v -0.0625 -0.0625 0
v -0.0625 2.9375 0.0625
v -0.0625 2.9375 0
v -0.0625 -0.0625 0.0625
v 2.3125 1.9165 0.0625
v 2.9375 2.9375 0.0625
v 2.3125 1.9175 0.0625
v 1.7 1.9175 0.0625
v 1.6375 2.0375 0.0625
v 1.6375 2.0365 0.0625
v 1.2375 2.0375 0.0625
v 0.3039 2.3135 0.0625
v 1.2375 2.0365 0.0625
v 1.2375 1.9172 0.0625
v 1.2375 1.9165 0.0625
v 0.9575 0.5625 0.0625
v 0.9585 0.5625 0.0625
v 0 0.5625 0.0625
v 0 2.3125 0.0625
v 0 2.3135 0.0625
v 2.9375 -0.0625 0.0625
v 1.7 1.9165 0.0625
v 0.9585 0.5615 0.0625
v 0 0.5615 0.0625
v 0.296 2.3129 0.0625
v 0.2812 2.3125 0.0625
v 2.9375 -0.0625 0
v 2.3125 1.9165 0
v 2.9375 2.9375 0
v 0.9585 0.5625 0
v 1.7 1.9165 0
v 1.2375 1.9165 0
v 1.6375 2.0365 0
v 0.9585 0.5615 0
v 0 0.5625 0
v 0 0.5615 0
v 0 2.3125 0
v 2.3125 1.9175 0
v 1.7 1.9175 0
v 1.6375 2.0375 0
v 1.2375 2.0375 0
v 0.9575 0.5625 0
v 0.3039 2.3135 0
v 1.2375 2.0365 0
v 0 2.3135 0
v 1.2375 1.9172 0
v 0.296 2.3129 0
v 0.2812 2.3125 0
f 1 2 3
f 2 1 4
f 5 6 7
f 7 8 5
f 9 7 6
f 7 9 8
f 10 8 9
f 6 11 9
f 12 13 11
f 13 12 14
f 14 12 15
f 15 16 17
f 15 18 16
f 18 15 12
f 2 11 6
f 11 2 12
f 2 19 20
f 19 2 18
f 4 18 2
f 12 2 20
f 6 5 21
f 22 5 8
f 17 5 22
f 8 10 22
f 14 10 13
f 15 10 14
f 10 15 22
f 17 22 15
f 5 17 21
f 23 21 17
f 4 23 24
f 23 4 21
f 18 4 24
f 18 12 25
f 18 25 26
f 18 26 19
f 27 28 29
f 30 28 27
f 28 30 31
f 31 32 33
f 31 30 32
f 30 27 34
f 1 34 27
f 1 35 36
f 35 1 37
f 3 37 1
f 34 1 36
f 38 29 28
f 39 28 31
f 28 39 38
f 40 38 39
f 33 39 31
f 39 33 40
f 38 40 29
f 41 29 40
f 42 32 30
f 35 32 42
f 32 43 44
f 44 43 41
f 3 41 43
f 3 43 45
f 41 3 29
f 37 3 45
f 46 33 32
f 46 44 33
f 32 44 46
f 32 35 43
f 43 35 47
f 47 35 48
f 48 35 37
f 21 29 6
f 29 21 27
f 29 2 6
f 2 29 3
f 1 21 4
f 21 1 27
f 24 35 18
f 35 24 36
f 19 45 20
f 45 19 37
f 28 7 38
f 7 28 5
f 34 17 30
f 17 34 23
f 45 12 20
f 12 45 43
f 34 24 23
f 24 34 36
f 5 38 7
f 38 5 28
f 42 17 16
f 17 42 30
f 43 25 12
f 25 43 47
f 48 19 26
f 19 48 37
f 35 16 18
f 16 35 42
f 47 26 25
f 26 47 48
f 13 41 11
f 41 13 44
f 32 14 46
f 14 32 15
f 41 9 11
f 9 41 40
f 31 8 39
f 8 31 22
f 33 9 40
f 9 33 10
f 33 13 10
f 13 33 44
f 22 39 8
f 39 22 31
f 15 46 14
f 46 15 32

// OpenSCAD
// element12.scad — left-turn belt tile (mirror of element11)
// Units: inches

straight   = false;
left_turn  = true;
right_turn = false;

plate_w = 2 + 7/8;
plate_d = 2 + 7/8;
plate_h = 1/16;
frame_w = 1/16;

belt_w    = 1.75;
belt_half = belt_w / 2;

hole_d = 3/32;
hole_r = hole_d / 2;

roller_count  = 13;
roller_h_size = 3/16;
roller_r      = roller_h_size / 2;
roller_inset  = plate_w / 20;
roller_x_lo   = 2 * roller_inset;
roller_x_hi   = plate_w - 2 * roller_inset;
roller_y_step = (plate_w - 2 * roller_inset) / 12;

b_L = plate_w / 2 - belt_half;
b_R = plate_w / 2 + belt_half;
nub = roller_x_hi - b_R;

arrow_w       = belt_w * 0.75;
arrow_shaft_w = arrow_w * 0.4;
arrow_shaft_h = 1.5;
arrow_head_h  = arrow_w / 2;
arrow_h       = arrow_shaft_h + arrow_head_h;
arrow_tip_y   = 3 * plate_d / 20 + 1/4 + 7 * plate_d / 10;
arrow_y       = arrow_tip_y - arrow_h;
arrow_outline = 1/16;

cx         = plate_w / 2;
r_curve    = 0.48;
y_merge    = arrow_y + arrow_shaft_h;
y_arc_ctr  = y_merge + 0.12;
y_entry    = y_arc_ctr + r_curve;
cx_l       = cx - r_curve;
cx_r       = cx + r_curve;
r_outer    = r_curve + belt_half;
h_straight = 0.24;

module rivet_holes() {
    spacing_x = plate_w / 10;
    spacing_y = plate_d / 10;
    inset_x   = spacing_x / 2;
    inset_y   = spacing_y / 2;
    translate([plate_w - inset_x, plate_d - inset_y, -1])
        cylinder(h = plate_h + 2, r = hole_r, $fn = 20);
    for (i = [0:9]) {
        translate([inset_x, inset_y + i * spacing_y, -1])
            cylinder(h = plate_h + 2, r = hole_r, $fn = 20);
        translate([inset_x + i * spacing_x, inset_y, -1])
            cylinder(h = plate_h + 2, r = hole_r, $fn = 20);
        if (inset_x + i * spacing_x <= roller_x_lo + roller_r - hole_r ||
            inset_x + i * spacing_x >= roller_x_hi - roller_r + hole_r) {
            translate([inset_x + i * spacing_x, plate_d - inset_y, -1])
                cylinder(h = plate_h + 2, r = hole_r, $fn = 20);
        }
    }
}

module frame() {
    color("black")
    difference() {
        translate([-frame_w, -frame_w, 0])
            cube([plate_w + 2 * frame_w, plate_d + 2 * frame_w, plate_h]);
        translate([0, 0, -0.001])
            cube([plate_w, plate_d, plate_h + 0.002]);
    }
}

module belt_cutout() {
    // Straight vertical strip (top)
    translate([(plate_w - belt_w) / 2, plate_d/2 + r_curve - 0.001, -0.001])
        cube([belt_w, plate_d/2 - r_curve + 0.002, plate_h + 0.002]);
    // Horizontal entry from right
    translate([cx_r - 0.001, plate_d/2 - belt_half - 0.001, -0.001])
        cube([plate_w - cx_r + 0.002, belt_w + 0.002, plate_h + 0.002]);
    // Arc corner fill: lower-left quadrant at (cx_r, plate_d/2 + r_curve)
    translate([cx_r, plate_d/2 + r_curve, -0.001])
    linear_extrude(plate_h + 0.002)
    intersection() {
        circle(r = r_outer, $fn = 120);
        translate([-r_outer, -r_outer]) square([r_outer, r_outer]);
    }
    // Curved corner — bottom-left of the top-right uncovered square
    translate([b_R, plate_d/2 + belt_half, -0.001])
    linear_extrude(plate_h + 0.002)
    difference() {
        square([b_L/2, b_L/2]);
        translate([b_L/2, b_L/2])
            circle(r = b_L/2, $fn = 120);
    }
}

module roller_slots() {
    // a. Horizontal bars — top-section only, right-clipped; i=12 full-width
    for (i = [0:roller_count - 1]) {
        if (roller_inset + i * roller_y_step >= y_arc_ctr - roller_y_step) {
            translate([0, 0, -0.001])
            hull() {
                translate([roller_x_lo + roller_r,
                           roller_inset + i * roller_y_step, 0])
                    cylinder(h = plate_h + 0.002, r = roller_r, $fn = 20);
                translate([(i == roller_count - 1 ? roller_x_hi : b_R) - roller_r,
                           roller_inset + i * roller_y_step, 0])
                    cylinder(h = plate_h + 0.002, r = roller_r, $fn = 20);
            }
        }
    }
    // b. Vertical entry bars — right side; skip if rx < cx_r
    for (i = [0:roller_count - 1]) {
        if (roller_inset + i * roller_y_step >= cx_r) {
            y_hi = (i == roller_count - 1) ? plate_d - roller_x_lo : plate_d/2 + belt_half;
            translate([0, 0, -0.001])
            hull() {
                translate([roller_inset + i * roller_y_step, roller_x_lo + roller_r, 0])
                    cylinder(h = plate_h + 0.002, r = roller_r, $fn = 20);
                translate([roller_inset + i * roller_y_step, y_hi - roller_r, 0])
                    cylinder(h = plate_h + 0.002, r = roller_r, $fn = 20);
            }
        }
    }
    // c. Arc radial bars — 11 bars, center (cx_r, plate_d/2 + r_curve), 180°–270°
    r_outer_bars = r_outer + nub;
    for (k = [0:10]) {
        theta = 180 + 2.25 + k * (85.5 / 10);
        translate([cx_r, plate_d/2 + r_curve, 0])
        rotate([0, 0, theta])
        translate([0, 0, -0.001])
        hull() {
            translate([r_outer_bars - roller_r, 0, 0])
                cylinder(h = plate_h + 0.002, r = roller_r, $fn = 20);
            translate([r_outer_bars - roller_r - nub, 0, 0])
                cylinder(h = plate_h + 0.002, r = roller_r, $fn = 20);
        }
    }
    // d. Diagonal corners — lower-right and upper-right of belt entry
    translate([b_R, plate_d/2 - belt_half, 0])
    rotate([0, 0, 45])
    translate([0, 0, -0.001])
    hull() {
        cylinder(h = plate_h + 0.002, r = roller_r, $fn = 20);
        translate([nub, 0, 0])
            cylinder(h = plate_h + 0.002, r = roller_r, $fn = 20);
    }
    translate([b_R, plate_d/2 + belt_half, 0])
    rotate([0, 0, 45])
    translate([0, 0, -0.001])
    hull() {
        cylinder(h = plate_h + 0.002, r = roller_r, $fn = 20);
        translate([nub, 0, 0])
            cylinder(h = plate_h + 0.002, r = roller_r, $fn = 20);
    }
}

module plate() {
    difference() {
        color("darkgray")
            cube([plate_w, plate_d, plate_h]);
        rivet_holes();
        roller_slots();
        belt_cutout();
    }
}

module rollers() {
    color("green")
    difference() {
        union() {
            // a. Horizontal bars
            for (i = [0:roller_count - 1]) {
                if (roller_inset + i * roller_y_step >= y_arc_ctr - roller_y_step) {
                    hull() {
                        translate([roller_x_lo + roller_r,
                                   roller_inset + i * roller_y_step, 0])
                            cylinder(h = plate_h, r = roller_r, $fn = 20);
                        translate([(i == roller_count - 1 ? roller_x_hi : b_R) - roller_r,
                                   roller_inset + i * roller_y_step, 0])
                            cylinder(h = plate_h, r = roller_r, $fn = 20);
                    }
                }
            }
            // b. Vertical entry bars
            for (i = [0:roller_count - 1]) {
                if (roller_inset + i * roller_y_step >= cx_r) {
                    y_hi = (i == roller_count - 1) ? plate_d - roller_x_lo : plate_d/2 + belt_half;
                    hull() {
                        translate([roller_inset + i * roller_y_step, roller_x_lo + roller_r, 0])
                            cylinder(h = plate_h, r = roller_r, $fn = 20);
                        translate([roller_inset + i * roller_y_step, y_hi - roller_r, 0])
                            cylinder(h = plate_h, r = roller_r, $fn = 20);
                    }
                }
            }
            // c. Arc radial bars
            r_outer_bars = r_outer + nub;
            for (k = [0:10]) {
                theta = 180 + 2.25 + k * (85.5 / 10);
                translate([cx_r, plate_d/2 + r_curve, 0])
                rotate([0, 0, theta])
                hull() {
                    translate([r_outer_bars - roller_r, 0, 0])
                        cylinder(h = plate_h, r = roller_r, $fn = 20);
                    translate([r_outer_bars - roller_r - nub, 0, 0])
                        cylinder(h = plate_h, r = roller_r, $fn = 20);
                }
            }
            // d. Diagonal corners — lower-right and upper-right of belt entry
            translate([b_R, plate_d/2 - belt_half, 0])
            rotate([0, 0, 45])
            hull() {
                cylinder(h = plate_h, r = roller_r, $fn = 20);
                translate([nub, 0, 0])
                    cylinder(h = plate_h, r = roller_r, $fn = 20);
            }
            translate([b_R, plate_d/2 + belt_half, 0])
            rotate([0, 0, 45])
            hull() {
                cylinder(h = plate_h, r = roller_r, $fn = 20);
                translate([nub, 0, 0])
                    cylinder(h = plate_h, r = roller_r, $fn = 20);
            }
        }
        belt_cutout();
    }
}

module rivets() {
    spacing_x = plate_w / 10;
    spacing_y = plate_d / 10;
    inset_x   = spacing_x / 2;
    inset_y   = spacing_y / 2;
    color("lightgray") {
        translate([plate_w - inset_x, plate_d - inset_y, 0])
            cylinder(h = plate_h, r = hole_r, $fn = 20);
        for (i = [0:9]) {
            translate([inset_x, inset_y + i * spacing_y, 0])
                cylinder(h = plate_h, r = hole_r, $fn = 20);
            translate([inset_x + i * spacing_x, inset_y, 0])
                cylinder(h = plate_h, r = hole_r, $fn = 20);
            if (inset_x + i * spacing_x <= roller_x_lo + roller_r - hole_r ||
                inset_x + i * spacing_x >= roller_x_hi - roller_r + hole_r) {
                translate([inset_x + i * spacing_x, plate_d - inset_y, 0])
                    cylinder(h = plate_h, r = hole_r, $fn = 20);
            }
        }
    }
}

module arrow_2d() {
    polygon([
        [-arrow_shaft_w / 2, 0],
        [ arrow_shaft_w / 2, 0],
        [ arrow_shaft_w / 2, arrow_shaft_h],
        [ arrow_w / 2,       arrow_shaft_h],
        [ 0,                 arrow_h],
        [-arrow_w / 2,       arrow_shaft_h],
        [-arrow_shaft_w / 2, arrow_shaft_h]
    ]);
}

module arrow() {
    color("green") {
        // Vertical segment: cx, from arc center up to arrowhead base
        translate([cx - arrow_shaft_w/2, plate_d/2 + r_curve, 0])
        linear_extrude(plate_h)
        difference() {
            square([arrow_shaft_w, y_merge - (plate_d/2 + r_curve)]);
            translate([arrow_outline, 0])
                square([arrow_shaft_w - 2*arrow_outline, y_merge - (plate_d/2 + r_curve)]);
        }
        // Arc shaft: hollow annulus, lower-left quadrant (180°–270°)
        translate([cx_r, plate_d/2 + r_curve, 0])
        linear_extrude(plate_h)
        intersection() {
            difference() {
                difference() {
                    circle(r = r_curve + arrow_shaft_w/2, $fn = 120);
                    circle(r = r_curve - arrow_shaft_w/2, $fn = 120);
                }
                offset(delta = -arrow_outline)
                difference() {
                    circle(r = r_curve + arrow_shaft_w/2, $fn = 120);
                    circle(r = r_curve - arrow_shaft_w/2, $fn = 120);
                }
            }
            translate([-(r_curve + arrow_shaft_w/2), -(r_curve + arrow_shaft_w/2)])
                square([r_curve + arrow_shaft_w/2, r_curve + arrow_shaft_w/2]);
        }
        // Horizontal segment: from arc 270° endpoint at (cx_r, plate_d/2) going right
        translate([cx_r, plate_d/2 - arrow_shaft_w/2, 0])
        linear_extrude(plate_h)
        difference() {
            square([h_straight, arrow_shaft_w]);
            translate([0, arrow_outline])
                square([h_straight, arrow_shaft_w - 2*arrow_outline]);
        }
        // End cap
        translate([cx_r + h_straight - arrow_outline, plate_d/2 - arrow_shaft_w/2, 0])
            cube([arrow_outline, arrow_shaft_w, plate_h]);
        // Arrowhead — clipped from full arrow_2d so base is open to shaft
        translate([cx, arrow_y, 0])
        linear_extrude(plate_h)
        intersection() {
            difference() {
                arrow_2d();
                offset(delta = -arrow_outline) arrow_2d();
            }
            translate([-arrow_w / 2, arrow_shaft_h])
                square([arrow_w, arrow_head_h]);
        }
    }
}

module belt() {
    color("black")
    difference() {
        union() {
            translate([cx_r, plate_d/2 - belt_half, 0])
                cube([plate_w - cx_r, belt_w, plate_h]);
            translate([cx_r, plate_d/2 + r_curve, 0])
            linear_extrude(plate_h)
            intersection() {
                circle(r = r_outer, $fn = 120);
                translate([-r_outer, -r_outer]) square([r_outer, r_outer]);
            }
            translate([b_L, plate_d/2 + r_curve, 0])
                cube([belt_w, plate_d/2 - r_curve, plate_h]);
            // Curved corner — bottom-left of the top-right uncovered square
            translate([b_R, plate_d/2 + belt_half, 0])
            linear_extrude(plate_h)
            difference() {
                square([b_L/2, b_L/2]);
                translate([b_L/2, b_L/2])
                    circle(r = b_L/2, $fn = 120);
            }
        }
        // Vertical segment cutout
        translate([cx - arrow_shaft_w/2, plate_d/2 + r_curve - 0.001, -0.001])
        linear_extrude(plate_h + 0.002)
        difference() {
            square([arrow_shaft_w, y_merge - (plate_d/2 + r_curve) + 0.001]);
            translate([arrow_outline, 0])
                square([arrow_shaft_w - 2*arrow_outline, y_merge - (plate_d/2 + r_curve)]);
        }
        // Arc shaft cutout
        translate([cx_r, plate_d/2 + r_curve, -0.001])
        linear_extrude(plate_h + 0.002)
        intersection() {
            difference() {
                difference() {
                    circle(r = r_curve + arrow_shaft_w/2, $fn = 120);
                    circle(r = r_curve - arrow_shaft_w/2, $fn = 120);
                }
                offset(delta = -arrow_outline)
                difference() {
                    circle(r = r_curve + arrow_shaft_w/2, $fn = 120);
                    circle(r = r_curve - arrow_shaft_w/2, $fn = 120);
                }
            }
            translate([-(r_curve + arrow_shaft_w/2), -(r_curve + arrow_shaft_w/2)])
                square([r_curve + arrow_shaft_w/2, r_curve + arrow_shaft_w/2]);
        }
        // Horizontal segment cutout
        translate([cx_r, plate_d/2 - arrow_shaft_w/2, -0.001])
        linear_extrude(plate_h + 0.002)
        difference() {
            square([h_straight, arrow_shaft_w]);
            translate([0, arrow_outline])
                square([h_straight, arrow_shaft_w - 2*arrow_outline]);
        }
        // End cap cutout
        translate([cx_r + h_straight - arrow_outline, plate_d/2 - arrow_shaft_w/2, -0.001])
            cube([arrow_outline, arrow_shaft_w, plate_h + 0.002]);
        // Arrowhead cutout — clipped from full arrow_2d so base is open to shaft
        translate([cx, arrow_y, -0.001])
        linear_extrude(plate_h + 0.002)
        intersection() {
            difference() {
                arrow_2d();
                offset(delta = -arrow_outline) arrow_2d();
            }
            translate([-arrow_w / 2, arrow_shaft_h])
                square([arrow_w, arrow_head_h]);
        }
    }
}

translate([plate_w, 0, 0])
mirror([1, 0, 0]) {
    frame();
    plate();
    rivets();
    rollers();
    belt();
    arrow();
}
